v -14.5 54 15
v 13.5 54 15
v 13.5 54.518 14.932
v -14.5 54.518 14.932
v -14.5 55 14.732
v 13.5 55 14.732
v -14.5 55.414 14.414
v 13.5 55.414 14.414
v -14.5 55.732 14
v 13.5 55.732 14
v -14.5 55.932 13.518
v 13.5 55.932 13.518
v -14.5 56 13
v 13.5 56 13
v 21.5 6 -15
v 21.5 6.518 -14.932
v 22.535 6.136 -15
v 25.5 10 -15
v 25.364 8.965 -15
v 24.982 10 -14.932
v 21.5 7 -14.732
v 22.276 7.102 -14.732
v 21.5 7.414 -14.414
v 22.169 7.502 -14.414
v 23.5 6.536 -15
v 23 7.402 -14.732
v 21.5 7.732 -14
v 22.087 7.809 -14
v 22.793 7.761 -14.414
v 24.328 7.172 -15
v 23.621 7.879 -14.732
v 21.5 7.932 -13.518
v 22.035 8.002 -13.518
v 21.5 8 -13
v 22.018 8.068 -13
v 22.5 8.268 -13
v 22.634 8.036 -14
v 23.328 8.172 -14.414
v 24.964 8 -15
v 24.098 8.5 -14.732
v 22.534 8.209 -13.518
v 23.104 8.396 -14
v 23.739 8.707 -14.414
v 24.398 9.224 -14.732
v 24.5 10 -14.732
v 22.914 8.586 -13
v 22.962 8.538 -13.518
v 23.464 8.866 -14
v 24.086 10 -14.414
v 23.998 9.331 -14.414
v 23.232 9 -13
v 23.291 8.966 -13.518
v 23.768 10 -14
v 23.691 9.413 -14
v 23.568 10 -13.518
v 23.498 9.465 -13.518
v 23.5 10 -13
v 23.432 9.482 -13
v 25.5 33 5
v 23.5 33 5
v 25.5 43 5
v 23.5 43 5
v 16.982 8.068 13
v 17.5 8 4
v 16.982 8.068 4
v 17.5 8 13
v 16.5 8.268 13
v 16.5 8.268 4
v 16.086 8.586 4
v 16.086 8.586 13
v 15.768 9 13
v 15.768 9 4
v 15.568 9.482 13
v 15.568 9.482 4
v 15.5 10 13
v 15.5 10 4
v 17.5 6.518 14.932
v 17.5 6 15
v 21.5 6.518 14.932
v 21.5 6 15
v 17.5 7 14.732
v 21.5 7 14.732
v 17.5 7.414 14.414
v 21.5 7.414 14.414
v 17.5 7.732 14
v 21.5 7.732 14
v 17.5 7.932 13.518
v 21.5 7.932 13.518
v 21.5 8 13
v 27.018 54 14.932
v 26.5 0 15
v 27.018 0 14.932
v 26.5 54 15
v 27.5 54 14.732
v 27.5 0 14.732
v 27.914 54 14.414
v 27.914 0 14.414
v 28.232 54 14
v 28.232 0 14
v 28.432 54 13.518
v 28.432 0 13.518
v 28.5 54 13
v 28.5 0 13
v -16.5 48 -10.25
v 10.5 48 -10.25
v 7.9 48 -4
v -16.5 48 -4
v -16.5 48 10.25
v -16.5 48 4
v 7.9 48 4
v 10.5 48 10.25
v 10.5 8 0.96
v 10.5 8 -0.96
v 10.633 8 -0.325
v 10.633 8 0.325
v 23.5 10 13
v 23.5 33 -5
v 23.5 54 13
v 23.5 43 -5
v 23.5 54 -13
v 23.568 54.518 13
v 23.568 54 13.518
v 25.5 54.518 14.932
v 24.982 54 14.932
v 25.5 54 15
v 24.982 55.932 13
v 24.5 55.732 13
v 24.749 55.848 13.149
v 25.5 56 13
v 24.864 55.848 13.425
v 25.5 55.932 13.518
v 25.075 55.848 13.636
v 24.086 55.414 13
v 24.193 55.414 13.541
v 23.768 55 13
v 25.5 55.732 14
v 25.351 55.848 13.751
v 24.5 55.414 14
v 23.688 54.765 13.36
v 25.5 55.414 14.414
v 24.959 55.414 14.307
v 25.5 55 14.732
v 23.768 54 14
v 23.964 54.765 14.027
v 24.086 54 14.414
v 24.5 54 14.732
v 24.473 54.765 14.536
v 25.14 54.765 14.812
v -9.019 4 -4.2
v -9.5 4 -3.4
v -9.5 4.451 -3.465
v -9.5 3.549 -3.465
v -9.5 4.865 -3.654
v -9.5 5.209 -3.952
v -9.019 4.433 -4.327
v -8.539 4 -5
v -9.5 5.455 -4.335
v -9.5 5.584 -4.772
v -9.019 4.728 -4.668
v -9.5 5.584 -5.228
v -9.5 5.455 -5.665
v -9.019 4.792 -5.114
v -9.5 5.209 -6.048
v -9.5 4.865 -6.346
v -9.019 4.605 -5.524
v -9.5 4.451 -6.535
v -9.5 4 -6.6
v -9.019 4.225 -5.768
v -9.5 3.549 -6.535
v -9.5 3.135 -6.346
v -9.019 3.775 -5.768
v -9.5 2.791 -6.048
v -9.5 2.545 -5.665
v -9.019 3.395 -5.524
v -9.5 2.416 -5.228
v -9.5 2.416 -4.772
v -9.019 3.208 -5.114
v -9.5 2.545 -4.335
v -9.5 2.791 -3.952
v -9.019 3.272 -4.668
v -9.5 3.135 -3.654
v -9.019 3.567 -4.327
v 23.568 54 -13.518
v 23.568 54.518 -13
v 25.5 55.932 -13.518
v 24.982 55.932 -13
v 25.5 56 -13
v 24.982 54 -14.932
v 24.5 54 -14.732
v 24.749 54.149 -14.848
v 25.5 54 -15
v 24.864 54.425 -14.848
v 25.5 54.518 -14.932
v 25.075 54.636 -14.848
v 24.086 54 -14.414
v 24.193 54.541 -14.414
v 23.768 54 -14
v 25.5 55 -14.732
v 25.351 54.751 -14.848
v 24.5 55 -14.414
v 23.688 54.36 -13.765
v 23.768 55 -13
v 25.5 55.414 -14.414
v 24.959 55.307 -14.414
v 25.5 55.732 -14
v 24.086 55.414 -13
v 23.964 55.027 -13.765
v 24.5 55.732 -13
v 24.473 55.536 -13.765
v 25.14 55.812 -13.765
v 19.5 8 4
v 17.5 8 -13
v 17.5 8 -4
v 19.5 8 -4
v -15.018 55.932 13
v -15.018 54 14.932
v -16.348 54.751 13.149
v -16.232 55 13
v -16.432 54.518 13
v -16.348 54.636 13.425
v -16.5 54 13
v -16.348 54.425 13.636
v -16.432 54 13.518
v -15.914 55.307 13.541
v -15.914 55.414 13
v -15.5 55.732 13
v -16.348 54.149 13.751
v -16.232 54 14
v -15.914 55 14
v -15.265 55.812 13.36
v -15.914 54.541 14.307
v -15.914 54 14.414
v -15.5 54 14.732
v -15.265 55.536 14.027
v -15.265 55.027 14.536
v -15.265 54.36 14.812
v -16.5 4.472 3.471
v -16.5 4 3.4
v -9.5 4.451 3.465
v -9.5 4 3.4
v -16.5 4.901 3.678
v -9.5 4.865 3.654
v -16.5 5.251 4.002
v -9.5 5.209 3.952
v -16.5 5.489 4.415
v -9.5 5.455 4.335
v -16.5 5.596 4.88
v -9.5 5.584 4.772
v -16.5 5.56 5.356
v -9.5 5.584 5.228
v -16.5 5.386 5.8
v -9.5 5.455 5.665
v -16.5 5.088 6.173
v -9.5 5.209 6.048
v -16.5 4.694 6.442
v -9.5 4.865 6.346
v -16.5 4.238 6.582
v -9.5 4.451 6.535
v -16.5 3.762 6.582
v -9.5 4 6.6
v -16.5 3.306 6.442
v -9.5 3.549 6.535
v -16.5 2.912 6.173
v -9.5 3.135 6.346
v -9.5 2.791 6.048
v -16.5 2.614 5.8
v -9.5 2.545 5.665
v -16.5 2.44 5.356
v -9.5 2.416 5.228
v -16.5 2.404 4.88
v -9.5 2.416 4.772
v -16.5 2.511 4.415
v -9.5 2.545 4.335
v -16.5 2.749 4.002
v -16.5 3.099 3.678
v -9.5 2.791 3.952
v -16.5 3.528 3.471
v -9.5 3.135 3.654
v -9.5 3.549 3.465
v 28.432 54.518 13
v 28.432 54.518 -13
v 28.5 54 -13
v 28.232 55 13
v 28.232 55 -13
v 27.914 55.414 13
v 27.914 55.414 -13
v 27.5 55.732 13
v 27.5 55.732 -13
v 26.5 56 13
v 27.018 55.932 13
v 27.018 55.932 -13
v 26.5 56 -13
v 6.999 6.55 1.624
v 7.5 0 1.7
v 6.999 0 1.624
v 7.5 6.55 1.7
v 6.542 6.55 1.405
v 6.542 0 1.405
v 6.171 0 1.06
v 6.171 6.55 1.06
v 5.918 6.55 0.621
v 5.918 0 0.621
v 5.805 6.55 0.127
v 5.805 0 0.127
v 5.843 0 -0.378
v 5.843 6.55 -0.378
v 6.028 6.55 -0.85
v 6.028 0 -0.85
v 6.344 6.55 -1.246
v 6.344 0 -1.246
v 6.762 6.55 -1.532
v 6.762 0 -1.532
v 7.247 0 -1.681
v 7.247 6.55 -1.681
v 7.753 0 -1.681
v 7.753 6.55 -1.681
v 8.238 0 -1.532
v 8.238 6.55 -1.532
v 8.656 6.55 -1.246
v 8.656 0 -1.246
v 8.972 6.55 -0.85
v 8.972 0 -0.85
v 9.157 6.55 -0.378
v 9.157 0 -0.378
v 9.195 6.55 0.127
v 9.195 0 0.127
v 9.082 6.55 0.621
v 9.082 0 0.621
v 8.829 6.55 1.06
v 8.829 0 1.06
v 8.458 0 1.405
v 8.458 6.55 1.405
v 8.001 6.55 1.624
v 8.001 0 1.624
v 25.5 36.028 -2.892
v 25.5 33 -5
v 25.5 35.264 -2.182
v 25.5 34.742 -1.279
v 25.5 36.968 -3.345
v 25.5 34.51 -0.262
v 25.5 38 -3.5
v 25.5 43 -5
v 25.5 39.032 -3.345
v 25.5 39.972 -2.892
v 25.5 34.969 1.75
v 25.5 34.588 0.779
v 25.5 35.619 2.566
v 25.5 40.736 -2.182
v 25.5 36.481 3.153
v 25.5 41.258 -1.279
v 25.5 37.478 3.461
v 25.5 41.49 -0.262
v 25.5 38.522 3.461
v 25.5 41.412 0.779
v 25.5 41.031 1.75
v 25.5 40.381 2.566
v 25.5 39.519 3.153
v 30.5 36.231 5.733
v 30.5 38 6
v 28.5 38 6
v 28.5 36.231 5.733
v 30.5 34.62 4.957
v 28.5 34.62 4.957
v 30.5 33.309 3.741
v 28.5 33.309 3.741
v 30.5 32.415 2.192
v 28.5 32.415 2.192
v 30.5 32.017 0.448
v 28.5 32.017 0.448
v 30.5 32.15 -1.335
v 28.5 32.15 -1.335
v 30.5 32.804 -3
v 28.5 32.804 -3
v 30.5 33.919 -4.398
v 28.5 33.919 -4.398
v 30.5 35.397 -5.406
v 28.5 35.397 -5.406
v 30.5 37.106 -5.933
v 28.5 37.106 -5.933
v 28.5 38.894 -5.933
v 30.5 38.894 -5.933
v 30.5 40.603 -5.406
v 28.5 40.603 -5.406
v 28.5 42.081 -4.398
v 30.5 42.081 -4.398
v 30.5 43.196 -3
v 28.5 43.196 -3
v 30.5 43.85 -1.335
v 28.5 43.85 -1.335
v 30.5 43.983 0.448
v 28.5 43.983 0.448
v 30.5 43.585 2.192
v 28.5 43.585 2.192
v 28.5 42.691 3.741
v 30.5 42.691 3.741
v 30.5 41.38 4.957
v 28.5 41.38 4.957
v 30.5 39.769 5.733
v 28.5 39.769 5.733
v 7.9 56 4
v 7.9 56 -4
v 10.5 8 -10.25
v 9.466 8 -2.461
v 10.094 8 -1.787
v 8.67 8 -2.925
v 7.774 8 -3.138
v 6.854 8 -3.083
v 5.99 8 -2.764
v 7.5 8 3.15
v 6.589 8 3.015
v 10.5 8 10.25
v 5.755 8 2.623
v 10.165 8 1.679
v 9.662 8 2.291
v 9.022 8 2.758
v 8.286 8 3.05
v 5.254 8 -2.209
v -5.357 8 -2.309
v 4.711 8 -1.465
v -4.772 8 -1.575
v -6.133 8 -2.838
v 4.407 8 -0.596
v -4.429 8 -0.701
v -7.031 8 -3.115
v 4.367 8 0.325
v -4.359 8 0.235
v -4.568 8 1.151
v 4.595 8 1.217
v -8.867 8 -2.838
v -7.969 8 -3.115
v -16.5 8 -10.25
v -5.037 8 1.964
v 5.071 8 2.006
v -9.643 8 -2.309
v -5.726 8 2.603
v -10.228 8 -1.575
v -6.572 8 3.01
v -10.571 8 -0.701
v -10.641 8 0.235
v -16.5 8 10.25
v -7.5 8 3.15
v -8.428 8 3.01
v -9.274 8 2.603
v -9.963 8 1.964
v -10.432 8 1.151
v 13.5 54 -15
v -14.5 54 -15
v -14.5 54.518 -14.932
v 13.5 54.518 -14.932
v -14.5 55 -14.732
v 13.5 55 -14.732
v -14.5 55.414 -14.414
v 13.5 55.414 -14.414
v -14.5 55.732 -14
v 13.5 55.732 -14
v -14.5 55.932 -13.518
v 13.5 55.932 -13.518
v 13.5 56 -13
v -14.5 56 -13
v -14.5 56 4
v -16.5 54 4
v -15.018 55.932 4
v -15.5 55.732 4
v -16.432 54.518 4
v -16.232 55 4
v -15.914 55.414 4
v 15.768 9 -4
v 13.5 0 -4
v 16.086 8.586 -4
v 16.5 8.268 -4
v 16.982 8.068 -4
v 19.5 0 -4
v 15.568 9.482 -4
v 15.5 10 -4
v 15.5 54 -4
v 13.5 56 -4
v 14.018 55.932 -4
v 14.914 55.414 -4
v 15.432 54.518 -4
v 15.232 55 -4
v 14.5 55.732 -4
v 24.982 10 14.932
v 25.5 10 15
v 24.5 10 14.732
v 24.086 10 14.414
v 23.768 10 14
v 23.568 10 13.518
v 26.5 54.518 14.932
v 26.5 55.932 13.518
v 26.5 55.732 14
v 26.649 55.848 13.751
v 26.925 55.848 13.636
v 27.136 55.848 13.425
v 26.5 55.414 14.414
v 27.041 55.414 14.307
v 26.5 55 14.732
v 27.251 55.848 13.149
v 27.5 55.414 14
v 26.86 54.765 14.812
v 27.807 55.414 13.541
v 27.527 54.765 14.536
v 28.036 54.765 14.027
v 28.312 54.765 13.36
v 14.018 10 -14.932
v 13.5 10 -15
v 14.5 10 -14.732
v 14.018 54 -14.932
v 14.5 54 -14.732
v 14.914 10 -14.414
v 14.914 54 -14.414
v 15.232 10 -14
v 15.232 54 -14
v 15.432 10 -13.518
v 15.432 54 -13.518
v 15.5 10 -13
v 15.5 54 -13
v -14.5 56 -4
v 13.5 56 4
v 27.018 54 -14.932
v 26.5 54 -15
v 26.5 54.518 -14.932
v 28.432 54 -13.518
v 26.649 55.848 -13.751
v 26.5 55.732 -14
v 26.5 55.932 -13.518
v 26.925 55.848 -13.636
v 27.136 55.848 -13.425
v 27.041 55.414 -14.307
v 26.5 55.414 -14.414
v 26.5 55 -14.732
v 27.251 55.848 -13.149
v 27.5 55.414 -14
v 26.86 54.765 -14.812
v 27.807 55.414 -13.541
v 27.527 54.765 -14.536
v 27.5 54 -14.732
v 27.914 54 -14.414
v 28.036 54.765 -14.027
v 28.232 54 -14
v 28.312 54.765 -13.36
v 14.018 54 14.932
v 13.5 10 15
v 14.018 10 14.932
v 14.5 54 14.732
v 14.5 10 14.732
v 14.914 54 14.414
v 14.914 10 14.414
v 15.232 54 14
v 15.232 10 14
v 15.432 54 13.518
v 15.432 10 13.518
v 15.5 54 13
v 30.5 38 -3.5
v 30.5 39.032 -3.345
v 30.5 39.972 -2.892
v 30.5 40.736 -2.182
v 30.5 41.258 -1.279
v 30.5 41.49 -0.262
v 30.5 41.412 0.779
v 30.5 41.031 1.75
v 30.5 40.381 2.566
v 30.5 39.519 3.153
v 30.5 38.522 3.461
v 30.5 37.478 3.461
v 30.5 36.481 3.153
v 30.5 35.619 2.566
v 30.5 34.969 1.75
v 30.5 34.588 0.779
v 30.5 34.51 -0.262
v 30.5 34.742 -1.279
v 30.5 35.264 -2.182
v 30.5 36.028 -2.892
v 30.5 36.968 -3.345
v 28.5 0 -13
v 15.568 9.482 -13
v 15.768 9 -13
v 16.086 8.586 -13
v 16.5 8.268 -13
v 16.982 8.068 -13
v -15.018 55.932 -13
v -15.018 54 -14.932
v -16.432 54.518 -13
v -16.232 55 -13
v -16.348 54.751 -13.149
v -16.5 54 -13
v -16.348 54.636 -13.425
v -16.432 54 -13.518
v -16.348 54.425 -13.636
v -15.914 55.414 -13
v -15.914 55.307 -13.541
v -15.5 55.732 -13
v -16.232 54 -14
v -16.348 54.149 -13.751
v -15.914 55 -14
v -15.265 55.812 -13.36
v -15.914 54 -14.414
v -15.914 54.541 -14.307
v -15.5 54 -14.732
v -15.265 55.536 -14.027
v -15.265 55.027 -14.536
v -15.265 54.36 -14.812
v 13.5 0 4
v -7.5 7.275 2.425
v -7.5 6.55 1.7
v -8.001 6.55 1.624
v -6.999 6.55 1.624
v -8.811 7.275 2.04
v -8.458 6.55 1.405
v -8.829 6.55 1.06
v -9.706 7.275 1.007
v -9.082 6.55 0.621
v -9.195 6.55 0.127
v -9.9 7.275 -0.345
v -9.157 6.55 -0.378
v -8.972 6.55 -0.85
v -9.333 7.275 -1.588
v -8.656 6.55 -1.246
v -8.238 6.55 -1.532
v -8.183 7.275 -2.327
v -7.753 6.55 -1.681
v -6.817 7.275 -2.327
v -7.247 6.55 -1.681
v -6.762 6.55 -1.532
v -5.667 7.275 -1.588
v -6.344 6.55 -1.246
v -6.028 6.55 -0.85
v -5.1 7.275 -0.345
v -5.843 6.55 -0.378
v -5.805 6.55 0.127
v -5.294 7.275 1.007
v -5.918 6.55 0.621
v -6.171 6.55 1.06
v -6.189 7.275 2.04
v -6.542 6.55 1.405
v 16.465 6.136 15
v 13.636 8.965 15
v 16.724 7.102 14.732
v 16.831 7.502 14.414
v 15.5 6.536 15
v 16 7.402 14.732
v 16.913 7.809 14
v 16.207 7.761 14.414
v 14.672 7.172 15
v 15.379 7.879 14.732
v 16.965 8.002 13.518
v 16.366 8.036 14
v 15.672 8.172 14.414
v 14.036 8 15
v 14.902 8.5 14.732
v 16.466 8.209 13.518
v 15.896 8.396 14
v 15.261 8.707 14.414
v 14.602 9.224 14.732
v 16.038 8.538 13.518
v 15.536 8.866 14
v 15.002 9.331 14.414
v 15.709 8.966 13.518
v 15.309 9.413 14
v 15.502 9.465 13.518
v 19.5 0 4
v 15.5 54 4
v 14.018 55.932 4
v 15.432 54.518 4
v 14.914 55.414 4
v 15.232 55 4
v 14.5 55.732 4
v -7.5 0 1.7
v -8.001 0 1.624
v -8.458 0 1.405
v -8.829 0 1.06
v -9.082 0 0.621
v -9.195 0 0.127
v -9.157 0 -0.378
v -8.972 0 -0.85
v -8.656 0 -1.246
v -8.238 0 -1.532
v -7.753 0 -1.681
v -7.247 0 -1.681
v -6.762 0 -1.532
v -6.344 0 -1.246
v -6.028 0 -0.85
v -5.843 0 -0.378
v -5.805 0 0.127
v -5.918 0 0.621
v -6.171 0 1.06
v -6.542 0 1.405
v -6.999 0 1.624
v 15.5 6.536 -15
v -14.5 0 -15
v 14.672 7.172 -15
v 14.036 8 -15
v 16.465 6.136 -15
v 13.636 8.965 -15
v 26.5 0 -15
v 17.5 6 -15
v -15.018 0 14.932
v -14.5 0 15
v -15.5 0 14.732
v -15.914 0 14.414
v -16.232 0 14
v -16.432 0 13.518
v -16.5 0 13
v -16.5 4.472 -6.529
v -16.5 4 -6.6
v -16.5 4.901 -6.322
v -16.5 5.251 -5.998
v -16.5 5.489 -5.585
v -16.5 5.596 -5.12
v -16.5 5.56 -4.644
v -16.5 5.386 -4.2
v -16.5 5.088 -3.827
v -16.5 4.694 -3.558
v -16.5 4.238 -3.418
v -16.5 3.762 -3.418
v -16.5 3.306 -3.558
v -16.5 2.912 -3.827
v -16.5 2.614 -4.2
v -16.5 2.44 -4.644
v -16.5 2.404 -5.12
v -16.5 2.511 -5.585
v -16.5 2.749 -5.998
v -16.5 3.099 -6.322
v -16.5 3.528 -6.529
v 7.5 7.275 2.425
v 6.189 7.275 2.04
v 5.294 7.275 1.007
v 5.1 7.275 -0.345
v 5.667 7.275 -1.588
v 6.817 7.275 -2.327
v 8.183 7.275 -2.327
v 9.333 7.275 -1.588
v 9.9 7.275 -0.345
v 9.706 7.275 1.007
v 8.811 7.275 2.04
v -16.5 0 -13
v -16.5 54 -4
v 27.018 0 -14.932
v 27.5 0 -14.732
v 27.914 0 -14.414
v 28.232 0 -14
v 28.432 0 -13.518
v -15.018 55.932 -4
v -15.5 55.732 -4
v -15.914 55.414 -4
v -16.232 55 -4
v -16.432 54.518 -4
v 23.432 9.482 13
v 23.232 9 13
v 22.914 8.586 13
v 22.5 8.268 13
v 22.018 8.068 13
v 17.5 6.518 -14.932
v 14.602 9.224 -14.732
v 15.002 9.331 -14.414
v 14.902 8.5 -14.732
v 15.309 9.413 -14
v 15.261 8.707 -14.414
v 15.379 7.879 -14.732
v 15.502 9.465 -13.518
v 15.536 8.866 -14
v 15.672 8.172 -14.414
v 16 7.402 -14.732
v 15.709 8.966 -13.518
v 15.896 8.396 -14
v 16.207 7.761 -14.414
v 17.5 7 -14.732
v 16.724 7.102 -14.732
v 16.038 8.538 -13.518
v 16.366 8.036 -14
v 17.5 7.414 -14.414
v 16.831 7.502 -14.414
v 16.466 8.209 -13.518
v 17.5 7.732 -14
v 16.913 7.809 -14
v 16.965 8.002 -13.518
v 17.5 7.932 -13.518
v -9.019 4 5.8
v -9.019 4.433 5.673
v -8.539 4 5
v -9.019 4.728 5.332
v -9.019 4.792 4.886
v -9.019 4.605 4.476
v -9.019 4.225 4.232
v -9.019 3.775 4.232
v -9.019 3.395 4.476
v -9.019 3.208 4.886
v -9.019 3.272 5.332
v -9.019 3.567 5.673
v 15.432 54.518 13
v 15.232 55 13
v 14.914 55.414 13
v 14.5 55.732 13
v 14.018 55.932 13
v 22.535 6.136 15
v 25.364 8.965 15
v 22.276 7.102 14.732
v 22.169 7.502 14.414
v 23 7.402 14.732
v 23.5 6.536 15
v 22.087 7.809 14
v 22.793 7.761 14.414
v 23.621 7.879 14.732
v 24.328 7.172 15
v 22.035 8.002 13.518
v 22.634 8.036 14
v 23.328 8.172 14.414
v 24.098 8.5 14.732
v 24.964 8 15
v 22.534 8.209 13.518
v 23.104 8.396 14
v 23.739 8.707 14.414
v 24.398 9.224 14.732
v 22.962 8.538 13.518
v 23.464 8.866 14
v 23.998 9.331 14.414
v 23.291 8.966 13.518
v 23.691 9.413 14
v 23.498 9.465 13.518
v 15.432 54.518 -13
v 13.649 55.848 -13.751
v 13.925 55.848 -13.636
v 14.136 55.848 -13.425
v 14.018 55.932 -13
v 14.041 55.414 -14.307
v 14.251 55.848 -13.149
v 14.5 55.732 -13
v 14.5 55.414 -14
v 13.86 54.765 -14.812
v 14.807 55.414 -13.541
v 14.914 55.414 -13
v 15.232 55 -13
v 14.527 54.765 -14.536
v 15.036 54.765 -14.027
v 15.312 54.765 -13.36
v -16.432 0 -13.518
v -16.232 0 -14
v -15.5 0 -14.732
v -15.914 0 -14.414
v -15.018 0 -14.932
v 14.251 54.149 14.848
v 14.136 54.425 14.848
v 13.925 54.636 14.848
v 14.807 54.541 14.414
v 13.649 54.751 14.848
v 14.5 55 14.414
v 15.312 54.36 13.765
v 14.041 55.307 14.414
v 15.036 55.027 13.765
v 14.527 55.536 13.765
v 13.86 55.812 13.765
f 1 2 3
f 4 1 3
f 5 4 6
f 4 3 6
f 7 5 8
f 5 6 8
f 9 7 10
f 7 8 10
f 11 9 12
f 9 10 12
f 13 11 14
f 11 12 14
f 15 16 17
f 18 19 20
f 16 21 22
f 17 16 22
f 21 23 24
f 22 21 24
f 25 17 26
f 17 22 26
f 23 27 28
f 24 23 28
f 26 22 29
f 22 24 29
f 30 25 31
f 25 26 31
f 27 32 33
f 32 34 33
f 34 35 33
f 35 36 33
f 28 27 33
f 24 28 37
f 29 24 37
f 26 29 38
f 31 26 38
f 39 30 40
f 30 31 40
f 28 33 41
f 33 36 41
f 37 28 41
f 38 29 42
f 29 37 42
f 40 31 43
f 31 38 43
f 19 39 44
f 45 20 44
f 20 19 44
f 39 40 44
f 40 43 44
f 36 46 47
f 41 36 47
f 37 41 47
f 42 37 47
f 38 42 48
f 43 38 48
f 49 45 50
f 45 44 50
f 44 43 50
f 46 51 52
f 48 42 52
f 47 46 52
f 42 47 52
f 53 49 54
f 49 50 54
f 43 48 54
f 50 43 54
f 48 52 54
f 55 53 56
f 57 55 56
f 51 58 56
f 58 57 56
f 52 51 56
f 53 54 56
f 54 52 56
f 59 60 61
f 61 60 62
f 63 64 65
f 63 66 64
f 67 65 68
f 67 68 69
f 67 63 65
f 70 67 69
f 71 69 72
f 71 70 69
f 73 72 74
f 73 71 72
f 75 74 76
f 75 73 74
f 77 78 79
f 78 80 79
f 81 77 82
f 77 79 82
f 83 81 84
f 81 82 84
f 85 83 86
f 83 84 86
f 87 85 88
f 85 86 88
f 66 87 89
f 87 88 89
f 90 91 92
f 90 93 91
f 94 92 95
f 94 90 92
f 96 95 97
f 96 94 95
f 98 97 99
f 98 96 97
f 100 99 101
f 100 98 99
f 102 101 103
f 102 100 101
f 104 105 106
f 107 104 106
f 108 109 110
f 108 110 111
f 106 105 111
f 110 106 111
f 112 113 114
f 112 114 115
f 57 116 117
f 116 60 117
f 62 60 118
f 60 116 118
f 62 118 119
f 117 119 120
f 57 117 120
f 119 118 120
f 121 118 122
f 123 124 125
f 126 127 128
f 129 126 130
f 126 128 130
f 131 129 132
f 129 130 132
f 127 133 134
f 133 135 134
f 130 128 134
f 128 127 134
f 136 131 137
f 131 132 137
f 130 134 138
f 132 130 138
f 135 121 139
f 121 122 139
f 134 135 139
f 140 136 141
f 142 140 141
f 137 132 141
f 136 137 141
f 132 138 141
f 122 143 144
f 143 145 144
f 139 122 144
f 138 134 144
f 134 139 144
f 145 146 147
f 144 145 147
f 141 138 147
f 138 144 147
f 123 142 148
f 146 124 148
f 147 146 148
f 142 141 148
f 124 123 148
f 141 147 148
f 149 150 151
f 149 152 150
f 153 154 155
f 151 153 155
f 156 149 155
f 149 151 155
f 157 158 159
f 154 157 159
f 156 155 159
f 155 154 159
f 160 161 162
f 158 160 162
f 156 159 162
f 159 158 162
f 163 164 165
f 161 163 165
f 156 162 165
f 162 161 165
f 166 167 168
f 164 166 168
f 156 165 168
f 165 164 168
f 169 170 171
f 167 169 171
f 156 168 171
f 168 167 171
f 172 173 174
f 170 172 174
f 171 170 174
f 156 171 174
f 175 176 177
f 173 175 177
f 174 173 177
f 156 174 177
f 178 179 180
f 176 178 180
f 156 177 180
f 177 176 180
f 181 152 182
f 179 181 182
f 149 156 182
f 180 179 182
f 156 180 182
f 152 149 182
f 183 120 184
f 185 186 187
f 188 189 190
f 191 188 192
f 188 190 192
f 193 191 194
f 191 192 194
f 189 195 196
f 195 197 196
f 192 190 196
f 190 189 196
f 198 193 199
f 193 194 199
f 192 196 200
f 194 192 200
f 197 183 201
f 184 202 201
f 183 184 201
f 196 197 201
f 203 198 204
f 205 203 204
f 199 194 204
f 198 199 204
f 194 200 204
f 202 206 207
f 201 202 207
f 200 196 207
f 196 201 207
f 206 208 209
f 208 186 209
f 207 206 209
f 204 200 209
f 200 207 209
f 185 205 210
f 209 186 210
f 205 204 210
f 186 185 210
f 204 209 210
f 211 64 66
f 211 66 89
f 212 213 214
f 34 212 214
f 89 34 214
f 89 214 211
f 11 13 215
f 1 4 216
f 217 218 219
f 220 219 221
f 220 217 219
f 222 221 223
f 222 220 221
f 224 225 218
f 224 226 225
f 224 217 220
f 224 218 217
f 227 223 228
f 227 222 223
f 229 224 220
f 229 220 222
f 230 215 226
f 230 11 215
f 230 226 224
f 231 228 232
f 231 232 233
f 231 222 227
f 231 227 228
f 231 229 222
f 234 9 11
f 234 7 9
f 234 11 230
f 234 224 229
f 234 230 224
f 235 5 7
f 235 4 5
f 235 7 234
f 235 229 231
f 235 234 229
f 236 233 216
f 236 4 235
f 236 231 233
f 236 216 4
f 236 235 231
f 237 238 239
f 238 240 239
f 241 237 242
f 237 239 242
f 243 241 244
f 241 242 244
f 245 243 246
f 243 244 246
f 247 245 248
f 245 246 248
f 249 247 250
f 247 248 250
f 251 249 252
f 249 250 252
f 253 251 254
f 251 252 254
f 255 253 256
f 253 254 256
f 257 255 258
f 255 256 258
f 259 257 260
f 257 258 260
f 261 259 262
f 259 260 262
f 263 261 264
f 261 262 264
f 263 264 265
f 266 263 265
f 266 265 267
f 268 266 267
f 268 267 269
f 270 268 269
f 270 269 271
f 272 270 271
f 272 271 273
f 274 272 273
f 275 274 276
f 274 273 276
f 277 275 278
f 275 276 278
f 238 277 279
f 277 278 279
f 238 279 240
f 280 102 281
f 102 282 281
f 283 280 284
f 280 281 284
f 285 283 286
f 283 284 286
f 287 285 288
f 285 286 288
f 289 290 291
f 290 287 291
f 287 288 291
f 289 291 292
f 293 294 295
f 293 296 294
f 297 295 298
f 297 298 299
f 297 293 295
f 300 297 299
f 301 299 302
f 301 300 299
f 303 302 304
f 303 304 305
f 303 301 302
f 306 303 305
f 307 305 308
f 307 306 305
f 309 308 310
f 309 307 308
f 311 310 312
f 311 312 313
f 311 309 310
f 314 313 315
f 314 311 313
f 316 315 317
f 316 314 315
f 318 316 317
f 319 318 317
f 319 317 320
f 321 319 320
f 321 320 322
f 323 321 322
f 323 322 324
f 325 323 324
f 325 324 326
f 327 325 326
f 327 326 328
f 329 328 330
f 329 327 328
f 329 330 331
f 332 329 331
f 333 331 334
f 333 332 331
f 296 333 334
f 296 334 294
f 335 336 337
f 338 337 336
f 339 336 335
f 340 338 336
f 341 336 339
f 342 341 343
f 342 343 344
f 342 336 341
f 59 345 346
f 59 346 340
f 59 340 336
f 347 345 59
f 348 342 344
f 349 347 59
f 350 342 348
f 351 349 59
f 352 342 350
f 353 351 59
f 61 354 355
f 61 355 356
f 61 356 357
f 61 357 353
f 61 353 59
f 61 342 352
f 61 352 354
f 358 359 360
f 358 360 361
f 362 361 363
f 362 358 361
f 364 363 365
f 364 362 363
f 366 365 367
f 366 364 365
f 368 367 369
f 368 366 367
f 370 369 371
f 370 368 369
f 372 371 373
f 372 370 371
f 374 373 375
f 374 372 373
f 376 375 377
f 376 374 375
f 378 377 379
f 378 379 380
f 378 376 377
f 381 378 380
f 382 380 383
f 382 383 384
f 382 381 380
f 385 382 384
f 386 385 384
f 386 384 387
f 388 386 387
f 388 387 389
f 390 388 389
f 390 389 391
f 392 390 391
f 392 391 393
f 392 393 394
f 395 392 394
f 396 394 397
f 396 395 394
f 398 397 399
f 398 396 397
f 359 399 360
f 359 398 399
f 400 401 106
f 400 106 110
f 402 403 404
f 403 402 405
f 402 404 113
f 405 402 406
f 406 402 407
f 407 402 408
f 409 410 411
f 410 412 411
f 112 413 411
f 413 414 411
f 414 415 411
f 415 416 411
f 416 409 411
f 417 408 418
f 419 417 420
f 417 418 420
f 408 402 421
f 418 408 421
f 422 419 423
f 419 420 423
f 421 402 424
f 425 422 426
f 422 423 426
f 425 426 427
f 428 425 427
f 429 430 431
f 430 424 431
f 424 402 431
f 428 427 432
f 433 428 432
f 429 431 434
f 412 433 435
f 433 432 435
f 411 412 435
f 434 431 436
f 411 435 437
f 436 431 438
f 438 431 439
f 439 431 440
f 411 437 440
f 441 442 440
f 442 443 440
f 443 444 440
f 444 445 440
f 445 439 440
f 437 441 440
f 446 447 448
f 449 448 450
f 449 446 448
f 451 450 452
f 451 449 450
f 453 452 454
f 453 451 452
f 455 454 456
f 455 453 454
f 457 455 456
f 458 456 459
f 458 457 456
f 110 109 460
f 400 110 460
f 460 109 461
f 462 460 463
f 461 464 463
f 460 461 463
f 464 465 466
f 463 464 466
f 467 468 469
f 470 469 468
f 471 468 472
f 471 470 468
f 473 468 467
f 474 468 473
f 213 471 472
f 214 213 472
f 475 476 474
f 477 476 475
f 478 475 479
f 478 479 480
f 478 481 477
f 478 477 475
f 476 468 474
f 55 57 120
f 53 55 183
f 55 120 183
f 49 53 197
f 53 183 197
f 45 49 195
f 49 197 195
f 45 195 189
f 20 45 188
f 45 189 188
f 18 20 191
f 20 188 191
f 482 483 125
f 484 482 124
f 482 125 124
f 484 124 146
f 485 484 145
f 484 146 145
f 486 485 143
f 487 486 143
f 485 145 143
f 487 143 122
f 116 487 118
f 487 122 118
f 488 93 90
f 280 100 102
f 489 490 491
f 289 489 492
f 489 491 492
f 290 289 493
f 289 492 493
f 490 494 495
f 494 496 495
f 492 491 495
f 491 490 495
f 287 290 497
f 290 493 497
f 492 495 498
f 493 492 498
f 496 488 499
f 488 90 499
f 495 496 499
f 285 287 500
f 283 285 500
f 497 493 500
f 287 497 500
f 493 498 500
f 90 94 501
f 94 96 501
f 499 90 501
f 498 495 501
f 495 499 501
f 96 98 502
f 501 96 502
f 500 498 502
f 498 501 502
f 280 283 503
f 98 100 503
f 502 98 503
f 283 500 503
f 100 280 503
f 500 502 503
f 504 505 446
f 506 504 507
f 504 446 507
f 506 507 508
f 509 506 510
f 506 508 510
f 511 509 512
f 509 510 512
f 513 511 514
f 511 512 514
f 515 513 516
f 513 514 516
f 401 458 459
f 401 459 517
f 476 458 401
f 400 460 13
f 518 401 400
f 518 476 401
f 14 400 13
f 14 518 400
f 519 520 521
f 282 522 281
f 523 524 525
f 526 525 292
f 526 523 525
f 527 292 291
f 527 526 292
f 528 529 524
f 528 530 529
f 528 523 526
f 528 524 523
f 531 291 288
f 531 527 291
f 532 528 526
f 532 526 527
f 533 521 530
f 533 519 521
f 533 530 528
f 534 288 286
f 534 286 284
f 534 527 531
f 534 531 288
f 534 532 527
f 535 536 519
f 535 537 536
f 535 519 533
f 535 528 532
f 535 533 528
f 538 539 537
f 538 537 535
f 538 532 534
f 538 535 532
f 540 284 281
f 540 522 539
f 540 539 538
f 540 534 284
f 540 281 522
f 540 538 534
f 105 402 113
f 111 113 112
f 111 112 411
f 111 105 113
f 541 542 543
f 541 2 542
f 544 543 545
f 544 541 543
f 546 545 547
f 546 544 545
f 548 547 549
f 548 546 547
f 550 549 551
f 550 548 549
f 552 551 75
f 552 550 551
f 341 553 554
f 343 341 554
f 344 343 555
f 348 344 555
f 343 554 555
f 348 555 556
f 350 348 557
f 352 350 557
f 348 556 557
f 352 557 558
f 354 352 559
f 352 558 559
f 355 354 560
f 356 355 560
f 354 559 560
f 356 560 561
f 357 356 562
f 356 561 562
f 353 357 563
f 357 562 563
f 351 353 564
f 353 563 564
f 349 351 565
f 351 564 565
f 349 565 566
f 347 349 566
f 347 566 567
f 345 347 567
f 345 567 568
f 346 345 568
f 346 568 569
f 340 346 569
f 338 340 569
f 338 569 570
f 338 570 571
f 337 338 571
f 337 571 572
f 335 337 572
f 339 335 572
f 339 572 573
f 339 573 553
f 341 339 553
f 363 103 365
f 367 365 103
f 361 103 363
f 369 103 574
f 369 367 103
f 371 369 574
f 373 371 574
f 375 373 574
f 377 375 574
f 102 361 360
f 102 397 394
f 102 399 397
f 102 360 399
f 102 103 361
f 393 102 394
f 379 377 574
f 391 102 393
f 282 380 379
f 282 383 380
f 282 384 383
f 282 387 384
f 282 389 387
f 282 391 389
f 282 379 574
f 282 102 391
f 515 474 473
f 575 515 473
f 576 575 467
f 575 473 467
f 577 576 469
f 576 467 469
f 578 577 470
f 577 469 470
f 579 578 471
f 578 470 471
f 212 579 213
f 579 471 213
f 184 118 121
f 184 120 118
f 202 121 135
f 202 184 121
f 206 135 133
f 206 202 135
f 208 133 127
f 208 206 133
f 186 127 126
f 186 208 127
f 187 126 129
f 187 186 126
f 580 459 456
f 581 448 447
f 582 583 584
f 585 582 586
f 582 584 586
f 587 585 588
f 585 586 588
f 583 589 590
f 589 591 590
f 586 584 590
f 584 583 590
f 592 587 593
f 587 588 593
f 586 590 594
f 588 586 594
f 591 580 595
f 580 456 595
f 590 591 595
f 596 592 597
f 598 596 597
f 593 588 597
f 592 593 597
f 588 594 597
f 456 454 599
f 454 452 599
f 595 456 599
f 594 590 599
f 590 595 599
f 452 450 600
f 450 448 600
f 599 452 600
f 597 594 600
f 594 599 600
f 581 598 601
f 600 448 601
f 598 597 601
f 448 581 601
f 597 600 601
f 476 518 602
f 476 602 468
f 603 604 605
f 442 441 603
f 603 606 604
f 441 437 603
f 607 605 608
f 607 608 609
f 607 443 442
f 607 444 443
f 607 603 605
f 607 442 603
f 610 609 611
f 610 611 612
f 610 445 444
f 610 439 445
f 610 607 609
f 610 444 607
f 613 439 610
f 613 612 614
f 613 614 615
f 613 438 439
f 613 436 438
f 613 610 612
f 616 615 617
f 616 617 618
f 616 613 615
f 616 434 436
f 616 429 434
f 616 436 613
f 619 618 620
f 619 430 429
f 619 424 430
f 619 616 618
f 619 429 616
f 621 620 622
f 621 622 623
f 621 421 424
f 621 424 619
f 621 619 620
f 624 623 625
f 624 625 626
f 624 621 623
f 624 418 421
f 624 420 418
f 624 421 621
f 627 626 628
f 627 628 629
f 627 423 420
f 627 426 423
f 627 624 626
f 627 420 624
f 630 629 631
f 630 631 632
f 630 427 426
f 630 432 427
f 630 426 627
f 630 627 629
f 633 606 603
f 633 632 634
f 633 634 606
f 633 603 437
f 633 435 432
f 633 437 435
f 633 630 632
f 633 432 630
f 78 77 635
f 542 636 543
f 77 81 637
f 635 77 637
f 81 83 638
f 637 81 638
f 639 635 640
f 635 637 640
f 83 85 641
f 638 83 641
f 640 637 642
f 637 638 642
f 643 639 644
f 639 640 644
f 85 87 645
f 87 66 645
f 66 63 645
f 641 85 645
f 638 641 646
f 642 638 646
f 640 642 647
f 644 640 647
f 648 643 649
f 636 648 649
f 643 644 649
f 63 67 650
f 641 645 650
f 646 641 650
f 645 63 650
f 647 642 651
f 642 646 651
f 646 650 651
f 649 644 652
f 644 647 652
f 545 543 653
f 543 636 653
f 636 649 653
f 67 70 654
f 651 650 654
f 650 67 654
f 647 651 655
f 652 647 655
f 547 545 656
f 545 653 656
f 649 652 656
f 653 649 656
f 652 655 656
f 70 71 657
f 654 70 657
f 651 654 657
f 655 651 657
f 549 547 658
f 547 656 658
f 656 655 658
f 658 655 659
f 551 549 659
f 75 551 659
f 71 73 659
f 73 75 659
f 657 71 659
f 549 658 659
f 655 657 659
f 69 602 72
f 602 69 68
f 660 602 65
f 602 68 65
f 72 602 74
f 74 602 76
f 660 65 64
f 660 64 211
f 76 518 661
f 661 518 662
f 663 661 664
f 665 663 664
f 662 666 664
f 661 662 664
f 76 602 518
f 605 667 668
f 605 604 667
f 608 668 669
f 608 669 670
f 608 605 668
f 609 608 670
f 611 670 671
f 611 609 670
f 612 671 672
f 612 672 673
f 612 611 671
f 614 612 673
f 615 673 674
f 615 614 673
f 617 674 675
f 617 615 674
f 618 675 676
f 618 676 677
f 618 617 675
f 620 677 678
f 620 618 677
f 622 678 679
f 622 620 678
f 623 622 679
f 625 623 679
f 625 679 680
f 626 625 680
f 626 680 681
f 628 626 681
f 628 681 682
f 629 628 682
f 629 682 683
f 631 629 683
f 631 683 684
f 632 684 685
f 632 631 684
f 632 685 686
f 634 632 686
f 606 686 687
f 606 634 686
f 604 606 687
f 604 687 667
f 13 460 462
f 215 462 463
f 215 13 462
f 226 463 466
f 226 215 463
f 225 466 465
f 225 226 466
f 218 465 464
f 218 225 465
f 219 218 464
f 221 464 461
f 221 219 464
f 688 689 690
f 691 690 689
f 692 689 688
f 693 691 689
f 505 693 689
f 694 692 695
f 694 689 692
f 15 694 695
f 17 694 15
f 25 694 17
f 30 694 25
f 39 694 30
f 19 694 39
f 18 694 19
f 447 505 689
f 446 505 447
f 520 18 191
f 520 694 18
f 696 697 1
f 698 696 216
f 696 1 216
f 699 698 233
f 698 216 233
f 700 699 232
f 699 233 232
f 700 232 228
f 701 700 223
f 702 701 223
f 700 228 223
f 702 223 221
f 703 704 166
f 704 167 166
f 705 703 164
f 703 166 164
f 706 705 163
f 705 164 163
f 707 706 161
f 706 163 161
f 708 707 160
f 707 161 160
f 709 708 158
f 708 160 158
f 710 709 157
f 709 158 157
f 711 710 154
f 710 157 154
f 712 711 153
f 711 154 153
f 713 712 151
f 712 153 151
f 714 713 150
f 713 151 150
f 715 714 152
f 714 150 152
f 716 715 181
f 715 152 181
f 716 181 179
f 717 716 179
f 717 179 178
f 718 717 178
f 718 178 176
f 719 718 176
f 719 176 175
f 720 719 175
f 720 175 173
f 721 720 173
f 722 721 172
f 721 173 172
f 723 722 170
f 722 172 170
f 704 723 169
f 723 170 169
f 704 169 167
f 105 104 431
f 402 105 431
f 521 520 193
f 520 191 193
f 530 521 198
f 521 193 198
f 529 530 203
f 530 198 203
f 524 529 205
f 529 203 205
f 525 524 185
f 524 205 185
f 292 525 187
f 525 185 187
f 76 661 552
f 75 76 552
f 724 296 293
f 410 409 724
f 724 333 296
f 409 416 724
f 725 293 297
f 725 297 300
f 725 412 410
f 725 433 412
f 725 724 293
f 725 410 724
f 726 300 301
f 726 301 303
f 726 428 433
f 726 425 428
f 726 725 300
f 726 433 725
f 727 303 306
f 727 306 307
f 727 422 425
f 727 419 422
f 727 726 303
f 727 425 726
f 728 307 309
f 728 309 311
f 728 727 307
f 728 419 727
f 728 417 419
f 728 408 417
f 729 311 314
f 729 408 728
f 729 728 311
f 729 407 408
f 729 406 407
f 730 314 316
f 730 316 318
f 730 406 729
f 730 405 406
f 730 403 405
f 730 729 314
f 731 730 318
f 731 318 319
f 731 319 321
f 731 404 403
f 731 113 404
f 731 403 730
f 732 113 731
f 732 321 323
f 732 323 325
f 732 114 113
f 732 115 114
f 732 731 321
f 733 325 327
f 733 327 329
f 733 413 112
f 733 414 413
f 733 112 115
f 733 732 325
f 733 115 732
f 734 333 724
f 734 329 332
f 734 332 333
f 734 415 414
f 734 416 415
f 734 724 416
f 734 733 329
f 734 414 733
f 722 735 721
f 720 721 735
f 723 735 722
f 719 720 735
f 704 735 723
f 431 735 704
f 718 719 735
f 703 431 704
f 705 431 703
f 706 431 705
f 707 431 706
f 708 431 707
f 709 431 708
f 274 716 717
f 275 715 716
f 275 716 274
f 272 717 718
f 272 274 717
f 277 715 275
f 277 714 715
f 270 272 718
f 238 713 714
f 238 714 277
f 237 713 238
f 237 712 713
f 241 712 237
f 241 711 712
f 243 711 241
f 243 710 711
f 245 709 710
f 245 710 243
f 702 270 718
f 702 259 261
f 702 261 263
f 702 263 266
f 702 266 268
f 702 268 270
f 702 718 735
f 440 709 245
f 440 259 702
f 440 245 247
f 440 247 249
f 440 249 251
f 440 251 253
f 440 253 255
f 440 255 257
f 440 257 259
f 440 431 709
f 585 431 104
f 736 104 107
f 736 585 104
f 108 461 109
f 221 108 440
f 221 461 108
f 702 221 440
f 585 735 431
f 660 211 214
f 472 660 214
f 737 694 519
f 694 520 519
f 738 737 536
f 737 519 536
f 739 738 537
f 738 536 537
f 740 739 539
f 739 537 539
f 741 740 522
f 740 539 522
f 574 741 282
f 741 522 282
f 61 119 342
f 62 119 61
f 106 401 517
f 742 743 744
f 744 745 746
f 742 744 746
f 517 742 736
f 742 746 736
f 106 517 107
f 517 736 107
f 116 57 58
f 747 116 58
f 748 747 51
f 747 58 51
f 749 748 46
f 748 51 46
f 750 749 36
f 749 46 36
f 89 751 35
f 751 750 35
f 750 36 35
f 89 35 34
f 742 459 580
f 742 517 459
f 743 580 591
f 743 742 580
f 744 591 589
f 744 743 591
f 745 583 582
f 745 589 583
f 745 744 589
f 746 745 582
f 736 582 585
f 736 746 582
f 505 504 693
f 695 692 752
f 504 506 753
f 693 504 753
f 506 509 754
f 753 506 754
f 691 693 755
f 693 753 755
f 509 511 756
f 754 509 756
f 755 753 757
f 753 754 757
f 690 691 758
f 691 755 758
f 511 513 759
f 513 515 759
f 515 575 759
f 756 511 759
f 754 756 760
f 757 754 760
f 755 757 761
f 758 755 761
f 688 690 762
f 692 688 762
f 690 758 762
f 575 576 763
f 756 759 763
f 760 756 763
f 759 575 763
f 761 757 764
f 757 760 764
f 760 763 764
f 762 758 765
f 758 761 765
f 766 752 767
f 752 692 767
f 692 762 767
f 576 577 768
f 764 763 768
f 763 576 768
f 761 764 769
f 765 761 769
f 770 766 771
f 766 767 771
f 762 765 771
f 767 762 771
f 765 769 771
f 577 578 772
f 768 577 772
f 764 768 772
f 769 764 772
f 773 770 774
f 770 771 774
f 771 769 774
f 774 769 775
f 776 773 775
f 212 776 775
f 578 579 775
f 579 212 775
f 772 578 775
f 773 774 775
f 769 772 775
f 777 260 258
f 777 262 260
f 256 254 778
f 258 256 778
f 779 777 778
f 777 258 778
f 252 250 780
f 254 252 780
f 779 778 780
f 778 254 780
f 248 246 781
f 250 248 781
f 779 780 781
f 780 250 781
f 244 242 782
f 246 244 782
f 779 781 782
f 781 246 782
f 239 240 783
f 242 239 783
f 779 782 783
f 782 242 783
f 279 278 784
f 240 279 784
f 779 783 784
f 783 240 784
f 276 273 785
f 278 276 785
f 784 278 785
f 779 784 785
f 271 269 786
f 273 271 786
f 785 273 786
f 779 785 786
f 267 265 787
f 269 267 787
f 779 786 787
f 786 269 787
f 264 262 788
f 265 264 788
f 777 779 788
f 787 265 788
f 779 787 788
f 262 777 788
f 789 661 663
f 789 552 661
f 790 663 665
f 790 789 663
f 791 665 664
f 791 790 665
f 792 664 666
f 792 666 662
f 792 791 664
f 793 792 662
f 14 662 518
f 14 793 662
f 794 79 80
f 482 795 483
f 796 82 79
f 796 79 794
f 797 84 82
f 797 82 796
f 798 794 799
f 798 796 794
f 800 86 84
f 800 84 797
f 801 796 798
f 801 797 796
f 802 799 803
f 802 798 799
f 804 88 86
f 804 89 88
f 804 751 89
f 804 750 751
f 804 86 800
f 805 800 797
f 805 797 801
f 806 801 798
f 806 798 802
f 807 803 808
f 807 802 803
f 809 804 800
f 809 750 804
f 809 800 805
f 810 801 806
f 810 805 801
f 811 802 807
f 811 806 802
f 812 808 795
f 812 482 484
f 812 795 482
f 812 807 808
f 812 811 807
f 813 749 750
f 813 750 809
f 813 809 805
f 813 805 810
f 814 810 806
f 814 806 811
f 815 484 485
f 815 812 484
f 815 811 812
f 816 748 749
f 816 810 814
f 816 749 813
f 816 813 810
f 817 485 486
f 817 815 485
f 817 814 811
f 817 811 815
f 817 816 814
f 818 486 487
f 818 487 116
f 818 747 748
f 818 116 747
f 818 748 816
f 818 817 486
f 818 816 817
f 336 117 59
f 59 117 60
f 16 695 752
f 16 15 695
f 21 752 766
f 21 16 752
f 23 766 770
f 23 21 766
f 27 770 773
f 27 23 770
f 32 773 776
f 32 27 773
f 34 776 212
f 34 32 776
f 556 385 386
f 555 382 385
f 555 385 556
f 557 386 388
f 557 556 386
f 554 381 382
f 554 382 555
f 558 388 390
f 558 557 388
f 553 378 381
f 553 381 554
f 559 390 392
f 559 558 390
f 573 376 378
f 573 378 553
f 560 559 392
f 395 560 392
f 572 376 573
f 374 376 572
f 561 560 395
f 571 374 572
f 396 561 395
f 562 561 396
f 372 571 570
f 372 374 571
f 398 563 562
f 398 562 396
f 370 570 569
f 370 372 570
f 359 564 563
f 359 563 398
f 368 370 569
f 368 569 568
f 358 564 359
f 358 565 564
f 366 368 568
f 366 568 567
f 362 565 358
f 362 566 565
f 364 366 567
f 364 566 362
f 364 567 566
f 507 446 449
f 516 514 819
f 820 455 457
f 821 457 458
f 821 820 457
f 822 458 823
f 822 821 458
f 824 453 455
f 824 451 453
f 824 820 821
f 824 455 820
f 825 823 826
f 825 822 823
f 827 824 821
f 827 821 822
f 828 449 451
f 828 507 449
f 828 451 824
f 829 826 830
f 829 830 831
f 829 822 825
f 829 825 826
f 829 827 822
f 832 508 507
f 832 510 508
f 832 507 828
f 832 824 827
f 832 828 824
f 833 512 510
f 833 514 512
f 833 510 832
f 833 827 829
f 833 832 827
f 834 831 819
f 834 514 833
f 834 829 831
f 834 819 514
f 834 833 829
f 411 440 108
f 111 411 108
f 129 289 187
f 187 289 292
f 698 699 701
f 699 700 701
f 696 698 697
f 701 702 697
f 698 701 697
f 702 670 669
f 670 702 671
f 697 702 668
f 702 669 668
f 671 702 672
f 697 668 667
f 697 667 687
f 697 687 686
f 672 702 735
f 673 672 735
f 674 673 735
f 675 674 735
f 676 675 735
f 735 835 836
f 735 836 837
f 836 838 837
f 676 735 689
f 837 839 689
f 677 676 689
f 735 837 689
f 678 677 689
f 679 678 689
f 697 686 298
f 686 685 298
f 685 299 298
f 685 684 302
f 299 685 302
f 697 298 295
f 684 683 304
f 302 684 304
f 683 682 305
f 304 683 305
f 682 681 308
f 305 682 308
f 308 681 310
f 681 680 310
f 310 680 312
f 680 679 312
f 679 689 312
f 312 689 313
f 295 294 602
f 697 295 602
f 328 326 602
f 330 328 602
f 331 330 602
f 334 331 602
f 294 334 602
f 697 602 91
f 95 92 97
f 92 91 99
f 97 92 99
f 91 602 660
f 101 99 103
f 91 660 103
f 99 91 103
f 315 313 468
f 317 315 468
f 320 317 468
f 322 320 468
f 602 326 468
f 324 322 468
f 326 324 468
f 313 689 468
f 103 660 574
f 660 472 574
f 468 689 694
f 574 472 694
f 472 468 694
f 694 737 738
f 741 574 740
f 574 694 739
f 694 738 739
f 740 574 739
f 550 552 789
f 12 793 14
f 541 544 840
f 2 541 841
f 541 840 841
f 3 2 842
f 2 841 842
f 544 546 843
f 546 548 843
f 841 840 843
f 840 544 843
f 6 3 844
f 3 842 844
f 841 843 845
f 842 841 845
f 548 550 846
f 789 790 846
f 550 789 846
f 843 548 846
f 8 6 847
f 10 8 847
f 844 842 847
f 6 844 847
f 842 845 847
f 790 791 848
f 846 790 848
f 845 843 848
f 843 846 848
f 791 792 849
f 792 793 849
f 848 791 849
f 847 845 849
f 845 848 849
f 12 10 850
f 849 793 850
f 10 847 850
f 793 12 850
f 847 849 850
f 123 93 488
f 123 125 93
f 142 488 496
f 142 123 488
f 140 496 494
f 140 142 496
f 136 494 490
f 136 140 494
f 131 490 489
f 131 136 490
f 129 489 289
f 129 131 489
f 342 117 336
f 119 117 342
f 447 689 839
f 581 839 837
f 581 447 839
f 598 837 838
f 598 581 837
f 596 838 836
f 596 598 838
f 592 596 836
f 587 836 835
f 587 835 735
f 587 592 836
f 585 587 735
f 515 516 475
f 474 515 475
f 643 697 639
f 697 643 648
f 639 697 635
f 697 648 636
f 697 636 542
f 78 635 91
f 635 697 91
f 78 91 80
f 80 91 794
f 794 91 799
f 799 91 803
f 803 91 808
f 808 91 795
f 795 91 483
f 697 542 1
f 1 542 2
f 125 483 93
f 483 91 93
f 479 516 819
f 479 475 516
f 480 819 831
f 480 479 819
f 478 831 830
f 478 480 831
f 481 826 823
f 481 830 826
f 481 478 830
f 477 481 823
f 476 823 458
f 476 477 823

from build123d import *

# Parameters (mm, degrees)
ESQUISSE1_W                                 = 45
ESQUISSE1_H                                 = 30
BOSS_EXTRU_1_DEPTH                          = 8
ESQUISSE5_W                                 = 30
ESQUISSE5_H                                 = 48
BOSS_EXTRU_3_DEPTH                          = 32
ENL_V_MAT_EXTRU_1_DEPTH                     = 27
ESQUISSE14_W                                = 6
ESQUISSE14_H                                = 8
ENL_V_MAT_EXTRU_2_DEPTH                     = 65.600696591
D_GAGEMENT_M31_D                            = 3.2
D_GAGEMENT_M31_DEPTH                        = 7
D_GAGEMENT_M31_TIP                          = 0.96137699
ESQUISSE16_W                                = 30
ESQUISSE16_H                                = 48
ESQUISSE16_R                                = 3.5
BOSS_EXTRU_4_DEPTH                          = 5
CONG_1_R                                    = 2
ESQUISSE17_W                                = 10
ESQUISSE17_H                                = 10
ENL_V_MAT_EXTRU_3_DEPTH                     = 2
BOSS_EXTRU_5_START                          = 2
ESQUISSE18_R                                = 6
ESQUISSE18_R_2                              = 3.5
BOSS_EXTRU_5_DEPTH                          = 2
FRAISAGE_POUR_VIS_T_TE_FRAIS_E_M31_AT_COUNT = 2
FRAISAGE_POUR_VIS_T_TE_FRAIS_E_M31_AT_PITCH = 15
ESQUISSE24_W                                = 8
ESQUISSE24_H                                = 8
BOSS_EXTRU_6_DEPTH                          = 2.6


with BuildPart() as part:
    # Esquisse1 → Boss.-Extru.1 (new body)
    with BuildSketch(Plane(origin=(0, 0, 0), x_dir=(1, 0, 0), z_dir=(0, 1, 0))):
        with Locations((6, 0)):
            Rectangle(ESQUISSE1_W, ESQUISSE1_H)
    extrude(amount=BOSS_EXTRU_1_DEPTH)

    # Esquisse5 → Boss.-Extru.3 (add)
    with BuildSketch(Plane.ZY.offset(16.5)):
        with Locations((0, 32)):
            Rectangle(ESQUISSE5_W, ESQUISSE5_H)
    extrude(amount=-BOSS_EXTRU_3_DEPTH)

    # Esquisse6 → Enlèv. mat.-Extru.1 (cut)
    with BuildSketch(Plane.ZY.offset(16.5)):
        Polygon((10.25, 48), (4, 48), (4, 56), (-4, 56), (-4, 48), (-10.25, 48), (-10.25, 8), (10.25, 8), align=None)
    extrude(amount=-ENL_V_MAT_EXTRU_1_DEPTH, mode=Mode.SUBTRACT)

    # Esquisse14 → Enlèv. mat.-Extru.2 (cut, through all)
    with BuildSketch(Plane(origin=(0, 56, 0), x_dir=(1, 0, 0), z_dir=(0, 1, 0))):
        with Locations((16.5, 0)):
            Rectangle(ESQUISSE14_W, ESQUISSE14_H)
    extrude(amount=-ENL_V_MAT_EXTRU_2_DEPTH, mode=Mode.SUBTRACT)

    # Dégagement M31
    with Locations(Plane.ZY.offset(16.5)):
        with Locations((5, 4), (-5, 4)):
            Hole(D_GAGEMENT_M31_D / 2, depth=D_GAGEMENT_M31_DEPTH)
            with Locations((0, 0, -(D_GAGEMENT_M31_DEPTH + D_GAGEMENT_M31_TIP / 2))):  # 118° drill point
                Cone(0, D_GAGEMENT_M31_D / 2, D_GAGEMENT_M31_TIP, mode=Mode.SUBTRACT)

    # Esquisse16 → Boss.-Extru.4 (add)
    with BuildSketch(Plane(origin=(28.5, 0, 0), x_dir=(0, 0, -1), z_dir=(1, 0, 0))):
        with Locations((0, 32)):
            Rectangle(ESQUISSE16_W, ESQUISSE16_H)
        with Locations((0, 38)):
            Circle(ESQUISSE16_R, mode=Mode.SUBTRACT)
    extrude(amount=-BOSS_EXTRU_4_DEPTH)

    # Congé1
    cong_1_edges = [part.edges().sort_by_distance(p)[0] for p in [
        (19.5, 8, -15),
        (19.5, 8, 15),
        (28.5, 28, 15),
        (28.5, 28, -15),
        (-16.5, 28, 15),
        (-16.5, 28, -15),
        (-16.5, 56, -9.5),
        (-16.5, 56, 9.5),
        (15.5, 8, -9.5),
        (15.5, 8, 9.5),
        (-0.5, 56, -15),
        (15.5, 32, -15),
        (-0.5, 56, 15),
        (15.5, 32, 15),
        (15.5, 56, -9.5),
        (15.5, 56, 9.5),
        (26, 56, 15),
        (23.5, 56, 0),
        (26, 56, -15),
        (28.5, 56, 0),
        (23.5, 8, 0),
        (23.5, 32, -15),
        (23.5, 32, 15),
    ]]
    fillet(cong_1_edges, radius=CONG_1_R)

    # Esquisse17 → Enlèv. mat.-Extru.3 (cut)
    with BuildSketch(Plane.ZY.offset(-23.5)):
        with Locations((0, 38)):
            Rectangle(ESQUISSE17_W, ESQUISSE17_H)
    extrude(amount=-ENL_V_MAT_EXTRU_3_DEPTH, mode=Mode.SUBTRACT)

    # Esquisse18 → Boss.-Extru.5 (add)
    with BuildSketch(Plane(origin=(28.5, 0, 0), x_dir=(0, 0, -1), z_dir=(1, 0, 0)).offset(BOSS_EXTRU_5_START)):
        with Locations((0, 38)):
            Circle(ESQUISSE18_R)
        with Locations((0, 38)):
            Circle(ESQUISSE18_R_2, mode=Mode.SUBTRACT)
    extrude(amount=-BOSS_EXTRU_5_DEPTH)

    # Esquisse23 → Fraisage pour vis à tête fraisée M31 (revolve, cut)
    with BuildSketch(Plane(origin=(-7.5, 8, 0), x_dir=(0, 0, 1), z_dir=(1, 0, 0))):
        Polygon((0, 0), (0, 8), (1.7, 8), (1.7, 1.45), (3.15, 0), align=None)
    fraisage_pour_vis_t_te_frais_e_m31 = revolve(axis=Axis((-7.5, 14.35, 0), (0, -1, 0)), mode=Mode.SUBTRACT)

    # Fraisage pour vis à tête fraisée M31 at: Fraisage pour vis à tête fraisée M31 ×2
    with Locations(*[(i * FRAISAGE_POUR_VIS_T_TE_FRAIS_E_M31_AT_PITCH, 0, 0) for i in range(1, FRAISAGE_POUR_VIS_T_TE_FRAIS_E_M31_AT_COUNT)]):
        add(fraisage_pour_vis_t_te_frais_e_m31, mode=Mode.SUBTRACT)

    # Esquisse24 → Boss.-Extru.6 (add)
    with BuildSketch(Plane.ZY.offset(-10.5)):
        with Locations((0, 52)):
            Rectangle(ESQUISSE24_W, ESQUISSE24_H)
    extrude(amount=BOSS_EXTRU_6_DEPTH)


solid = part.part
